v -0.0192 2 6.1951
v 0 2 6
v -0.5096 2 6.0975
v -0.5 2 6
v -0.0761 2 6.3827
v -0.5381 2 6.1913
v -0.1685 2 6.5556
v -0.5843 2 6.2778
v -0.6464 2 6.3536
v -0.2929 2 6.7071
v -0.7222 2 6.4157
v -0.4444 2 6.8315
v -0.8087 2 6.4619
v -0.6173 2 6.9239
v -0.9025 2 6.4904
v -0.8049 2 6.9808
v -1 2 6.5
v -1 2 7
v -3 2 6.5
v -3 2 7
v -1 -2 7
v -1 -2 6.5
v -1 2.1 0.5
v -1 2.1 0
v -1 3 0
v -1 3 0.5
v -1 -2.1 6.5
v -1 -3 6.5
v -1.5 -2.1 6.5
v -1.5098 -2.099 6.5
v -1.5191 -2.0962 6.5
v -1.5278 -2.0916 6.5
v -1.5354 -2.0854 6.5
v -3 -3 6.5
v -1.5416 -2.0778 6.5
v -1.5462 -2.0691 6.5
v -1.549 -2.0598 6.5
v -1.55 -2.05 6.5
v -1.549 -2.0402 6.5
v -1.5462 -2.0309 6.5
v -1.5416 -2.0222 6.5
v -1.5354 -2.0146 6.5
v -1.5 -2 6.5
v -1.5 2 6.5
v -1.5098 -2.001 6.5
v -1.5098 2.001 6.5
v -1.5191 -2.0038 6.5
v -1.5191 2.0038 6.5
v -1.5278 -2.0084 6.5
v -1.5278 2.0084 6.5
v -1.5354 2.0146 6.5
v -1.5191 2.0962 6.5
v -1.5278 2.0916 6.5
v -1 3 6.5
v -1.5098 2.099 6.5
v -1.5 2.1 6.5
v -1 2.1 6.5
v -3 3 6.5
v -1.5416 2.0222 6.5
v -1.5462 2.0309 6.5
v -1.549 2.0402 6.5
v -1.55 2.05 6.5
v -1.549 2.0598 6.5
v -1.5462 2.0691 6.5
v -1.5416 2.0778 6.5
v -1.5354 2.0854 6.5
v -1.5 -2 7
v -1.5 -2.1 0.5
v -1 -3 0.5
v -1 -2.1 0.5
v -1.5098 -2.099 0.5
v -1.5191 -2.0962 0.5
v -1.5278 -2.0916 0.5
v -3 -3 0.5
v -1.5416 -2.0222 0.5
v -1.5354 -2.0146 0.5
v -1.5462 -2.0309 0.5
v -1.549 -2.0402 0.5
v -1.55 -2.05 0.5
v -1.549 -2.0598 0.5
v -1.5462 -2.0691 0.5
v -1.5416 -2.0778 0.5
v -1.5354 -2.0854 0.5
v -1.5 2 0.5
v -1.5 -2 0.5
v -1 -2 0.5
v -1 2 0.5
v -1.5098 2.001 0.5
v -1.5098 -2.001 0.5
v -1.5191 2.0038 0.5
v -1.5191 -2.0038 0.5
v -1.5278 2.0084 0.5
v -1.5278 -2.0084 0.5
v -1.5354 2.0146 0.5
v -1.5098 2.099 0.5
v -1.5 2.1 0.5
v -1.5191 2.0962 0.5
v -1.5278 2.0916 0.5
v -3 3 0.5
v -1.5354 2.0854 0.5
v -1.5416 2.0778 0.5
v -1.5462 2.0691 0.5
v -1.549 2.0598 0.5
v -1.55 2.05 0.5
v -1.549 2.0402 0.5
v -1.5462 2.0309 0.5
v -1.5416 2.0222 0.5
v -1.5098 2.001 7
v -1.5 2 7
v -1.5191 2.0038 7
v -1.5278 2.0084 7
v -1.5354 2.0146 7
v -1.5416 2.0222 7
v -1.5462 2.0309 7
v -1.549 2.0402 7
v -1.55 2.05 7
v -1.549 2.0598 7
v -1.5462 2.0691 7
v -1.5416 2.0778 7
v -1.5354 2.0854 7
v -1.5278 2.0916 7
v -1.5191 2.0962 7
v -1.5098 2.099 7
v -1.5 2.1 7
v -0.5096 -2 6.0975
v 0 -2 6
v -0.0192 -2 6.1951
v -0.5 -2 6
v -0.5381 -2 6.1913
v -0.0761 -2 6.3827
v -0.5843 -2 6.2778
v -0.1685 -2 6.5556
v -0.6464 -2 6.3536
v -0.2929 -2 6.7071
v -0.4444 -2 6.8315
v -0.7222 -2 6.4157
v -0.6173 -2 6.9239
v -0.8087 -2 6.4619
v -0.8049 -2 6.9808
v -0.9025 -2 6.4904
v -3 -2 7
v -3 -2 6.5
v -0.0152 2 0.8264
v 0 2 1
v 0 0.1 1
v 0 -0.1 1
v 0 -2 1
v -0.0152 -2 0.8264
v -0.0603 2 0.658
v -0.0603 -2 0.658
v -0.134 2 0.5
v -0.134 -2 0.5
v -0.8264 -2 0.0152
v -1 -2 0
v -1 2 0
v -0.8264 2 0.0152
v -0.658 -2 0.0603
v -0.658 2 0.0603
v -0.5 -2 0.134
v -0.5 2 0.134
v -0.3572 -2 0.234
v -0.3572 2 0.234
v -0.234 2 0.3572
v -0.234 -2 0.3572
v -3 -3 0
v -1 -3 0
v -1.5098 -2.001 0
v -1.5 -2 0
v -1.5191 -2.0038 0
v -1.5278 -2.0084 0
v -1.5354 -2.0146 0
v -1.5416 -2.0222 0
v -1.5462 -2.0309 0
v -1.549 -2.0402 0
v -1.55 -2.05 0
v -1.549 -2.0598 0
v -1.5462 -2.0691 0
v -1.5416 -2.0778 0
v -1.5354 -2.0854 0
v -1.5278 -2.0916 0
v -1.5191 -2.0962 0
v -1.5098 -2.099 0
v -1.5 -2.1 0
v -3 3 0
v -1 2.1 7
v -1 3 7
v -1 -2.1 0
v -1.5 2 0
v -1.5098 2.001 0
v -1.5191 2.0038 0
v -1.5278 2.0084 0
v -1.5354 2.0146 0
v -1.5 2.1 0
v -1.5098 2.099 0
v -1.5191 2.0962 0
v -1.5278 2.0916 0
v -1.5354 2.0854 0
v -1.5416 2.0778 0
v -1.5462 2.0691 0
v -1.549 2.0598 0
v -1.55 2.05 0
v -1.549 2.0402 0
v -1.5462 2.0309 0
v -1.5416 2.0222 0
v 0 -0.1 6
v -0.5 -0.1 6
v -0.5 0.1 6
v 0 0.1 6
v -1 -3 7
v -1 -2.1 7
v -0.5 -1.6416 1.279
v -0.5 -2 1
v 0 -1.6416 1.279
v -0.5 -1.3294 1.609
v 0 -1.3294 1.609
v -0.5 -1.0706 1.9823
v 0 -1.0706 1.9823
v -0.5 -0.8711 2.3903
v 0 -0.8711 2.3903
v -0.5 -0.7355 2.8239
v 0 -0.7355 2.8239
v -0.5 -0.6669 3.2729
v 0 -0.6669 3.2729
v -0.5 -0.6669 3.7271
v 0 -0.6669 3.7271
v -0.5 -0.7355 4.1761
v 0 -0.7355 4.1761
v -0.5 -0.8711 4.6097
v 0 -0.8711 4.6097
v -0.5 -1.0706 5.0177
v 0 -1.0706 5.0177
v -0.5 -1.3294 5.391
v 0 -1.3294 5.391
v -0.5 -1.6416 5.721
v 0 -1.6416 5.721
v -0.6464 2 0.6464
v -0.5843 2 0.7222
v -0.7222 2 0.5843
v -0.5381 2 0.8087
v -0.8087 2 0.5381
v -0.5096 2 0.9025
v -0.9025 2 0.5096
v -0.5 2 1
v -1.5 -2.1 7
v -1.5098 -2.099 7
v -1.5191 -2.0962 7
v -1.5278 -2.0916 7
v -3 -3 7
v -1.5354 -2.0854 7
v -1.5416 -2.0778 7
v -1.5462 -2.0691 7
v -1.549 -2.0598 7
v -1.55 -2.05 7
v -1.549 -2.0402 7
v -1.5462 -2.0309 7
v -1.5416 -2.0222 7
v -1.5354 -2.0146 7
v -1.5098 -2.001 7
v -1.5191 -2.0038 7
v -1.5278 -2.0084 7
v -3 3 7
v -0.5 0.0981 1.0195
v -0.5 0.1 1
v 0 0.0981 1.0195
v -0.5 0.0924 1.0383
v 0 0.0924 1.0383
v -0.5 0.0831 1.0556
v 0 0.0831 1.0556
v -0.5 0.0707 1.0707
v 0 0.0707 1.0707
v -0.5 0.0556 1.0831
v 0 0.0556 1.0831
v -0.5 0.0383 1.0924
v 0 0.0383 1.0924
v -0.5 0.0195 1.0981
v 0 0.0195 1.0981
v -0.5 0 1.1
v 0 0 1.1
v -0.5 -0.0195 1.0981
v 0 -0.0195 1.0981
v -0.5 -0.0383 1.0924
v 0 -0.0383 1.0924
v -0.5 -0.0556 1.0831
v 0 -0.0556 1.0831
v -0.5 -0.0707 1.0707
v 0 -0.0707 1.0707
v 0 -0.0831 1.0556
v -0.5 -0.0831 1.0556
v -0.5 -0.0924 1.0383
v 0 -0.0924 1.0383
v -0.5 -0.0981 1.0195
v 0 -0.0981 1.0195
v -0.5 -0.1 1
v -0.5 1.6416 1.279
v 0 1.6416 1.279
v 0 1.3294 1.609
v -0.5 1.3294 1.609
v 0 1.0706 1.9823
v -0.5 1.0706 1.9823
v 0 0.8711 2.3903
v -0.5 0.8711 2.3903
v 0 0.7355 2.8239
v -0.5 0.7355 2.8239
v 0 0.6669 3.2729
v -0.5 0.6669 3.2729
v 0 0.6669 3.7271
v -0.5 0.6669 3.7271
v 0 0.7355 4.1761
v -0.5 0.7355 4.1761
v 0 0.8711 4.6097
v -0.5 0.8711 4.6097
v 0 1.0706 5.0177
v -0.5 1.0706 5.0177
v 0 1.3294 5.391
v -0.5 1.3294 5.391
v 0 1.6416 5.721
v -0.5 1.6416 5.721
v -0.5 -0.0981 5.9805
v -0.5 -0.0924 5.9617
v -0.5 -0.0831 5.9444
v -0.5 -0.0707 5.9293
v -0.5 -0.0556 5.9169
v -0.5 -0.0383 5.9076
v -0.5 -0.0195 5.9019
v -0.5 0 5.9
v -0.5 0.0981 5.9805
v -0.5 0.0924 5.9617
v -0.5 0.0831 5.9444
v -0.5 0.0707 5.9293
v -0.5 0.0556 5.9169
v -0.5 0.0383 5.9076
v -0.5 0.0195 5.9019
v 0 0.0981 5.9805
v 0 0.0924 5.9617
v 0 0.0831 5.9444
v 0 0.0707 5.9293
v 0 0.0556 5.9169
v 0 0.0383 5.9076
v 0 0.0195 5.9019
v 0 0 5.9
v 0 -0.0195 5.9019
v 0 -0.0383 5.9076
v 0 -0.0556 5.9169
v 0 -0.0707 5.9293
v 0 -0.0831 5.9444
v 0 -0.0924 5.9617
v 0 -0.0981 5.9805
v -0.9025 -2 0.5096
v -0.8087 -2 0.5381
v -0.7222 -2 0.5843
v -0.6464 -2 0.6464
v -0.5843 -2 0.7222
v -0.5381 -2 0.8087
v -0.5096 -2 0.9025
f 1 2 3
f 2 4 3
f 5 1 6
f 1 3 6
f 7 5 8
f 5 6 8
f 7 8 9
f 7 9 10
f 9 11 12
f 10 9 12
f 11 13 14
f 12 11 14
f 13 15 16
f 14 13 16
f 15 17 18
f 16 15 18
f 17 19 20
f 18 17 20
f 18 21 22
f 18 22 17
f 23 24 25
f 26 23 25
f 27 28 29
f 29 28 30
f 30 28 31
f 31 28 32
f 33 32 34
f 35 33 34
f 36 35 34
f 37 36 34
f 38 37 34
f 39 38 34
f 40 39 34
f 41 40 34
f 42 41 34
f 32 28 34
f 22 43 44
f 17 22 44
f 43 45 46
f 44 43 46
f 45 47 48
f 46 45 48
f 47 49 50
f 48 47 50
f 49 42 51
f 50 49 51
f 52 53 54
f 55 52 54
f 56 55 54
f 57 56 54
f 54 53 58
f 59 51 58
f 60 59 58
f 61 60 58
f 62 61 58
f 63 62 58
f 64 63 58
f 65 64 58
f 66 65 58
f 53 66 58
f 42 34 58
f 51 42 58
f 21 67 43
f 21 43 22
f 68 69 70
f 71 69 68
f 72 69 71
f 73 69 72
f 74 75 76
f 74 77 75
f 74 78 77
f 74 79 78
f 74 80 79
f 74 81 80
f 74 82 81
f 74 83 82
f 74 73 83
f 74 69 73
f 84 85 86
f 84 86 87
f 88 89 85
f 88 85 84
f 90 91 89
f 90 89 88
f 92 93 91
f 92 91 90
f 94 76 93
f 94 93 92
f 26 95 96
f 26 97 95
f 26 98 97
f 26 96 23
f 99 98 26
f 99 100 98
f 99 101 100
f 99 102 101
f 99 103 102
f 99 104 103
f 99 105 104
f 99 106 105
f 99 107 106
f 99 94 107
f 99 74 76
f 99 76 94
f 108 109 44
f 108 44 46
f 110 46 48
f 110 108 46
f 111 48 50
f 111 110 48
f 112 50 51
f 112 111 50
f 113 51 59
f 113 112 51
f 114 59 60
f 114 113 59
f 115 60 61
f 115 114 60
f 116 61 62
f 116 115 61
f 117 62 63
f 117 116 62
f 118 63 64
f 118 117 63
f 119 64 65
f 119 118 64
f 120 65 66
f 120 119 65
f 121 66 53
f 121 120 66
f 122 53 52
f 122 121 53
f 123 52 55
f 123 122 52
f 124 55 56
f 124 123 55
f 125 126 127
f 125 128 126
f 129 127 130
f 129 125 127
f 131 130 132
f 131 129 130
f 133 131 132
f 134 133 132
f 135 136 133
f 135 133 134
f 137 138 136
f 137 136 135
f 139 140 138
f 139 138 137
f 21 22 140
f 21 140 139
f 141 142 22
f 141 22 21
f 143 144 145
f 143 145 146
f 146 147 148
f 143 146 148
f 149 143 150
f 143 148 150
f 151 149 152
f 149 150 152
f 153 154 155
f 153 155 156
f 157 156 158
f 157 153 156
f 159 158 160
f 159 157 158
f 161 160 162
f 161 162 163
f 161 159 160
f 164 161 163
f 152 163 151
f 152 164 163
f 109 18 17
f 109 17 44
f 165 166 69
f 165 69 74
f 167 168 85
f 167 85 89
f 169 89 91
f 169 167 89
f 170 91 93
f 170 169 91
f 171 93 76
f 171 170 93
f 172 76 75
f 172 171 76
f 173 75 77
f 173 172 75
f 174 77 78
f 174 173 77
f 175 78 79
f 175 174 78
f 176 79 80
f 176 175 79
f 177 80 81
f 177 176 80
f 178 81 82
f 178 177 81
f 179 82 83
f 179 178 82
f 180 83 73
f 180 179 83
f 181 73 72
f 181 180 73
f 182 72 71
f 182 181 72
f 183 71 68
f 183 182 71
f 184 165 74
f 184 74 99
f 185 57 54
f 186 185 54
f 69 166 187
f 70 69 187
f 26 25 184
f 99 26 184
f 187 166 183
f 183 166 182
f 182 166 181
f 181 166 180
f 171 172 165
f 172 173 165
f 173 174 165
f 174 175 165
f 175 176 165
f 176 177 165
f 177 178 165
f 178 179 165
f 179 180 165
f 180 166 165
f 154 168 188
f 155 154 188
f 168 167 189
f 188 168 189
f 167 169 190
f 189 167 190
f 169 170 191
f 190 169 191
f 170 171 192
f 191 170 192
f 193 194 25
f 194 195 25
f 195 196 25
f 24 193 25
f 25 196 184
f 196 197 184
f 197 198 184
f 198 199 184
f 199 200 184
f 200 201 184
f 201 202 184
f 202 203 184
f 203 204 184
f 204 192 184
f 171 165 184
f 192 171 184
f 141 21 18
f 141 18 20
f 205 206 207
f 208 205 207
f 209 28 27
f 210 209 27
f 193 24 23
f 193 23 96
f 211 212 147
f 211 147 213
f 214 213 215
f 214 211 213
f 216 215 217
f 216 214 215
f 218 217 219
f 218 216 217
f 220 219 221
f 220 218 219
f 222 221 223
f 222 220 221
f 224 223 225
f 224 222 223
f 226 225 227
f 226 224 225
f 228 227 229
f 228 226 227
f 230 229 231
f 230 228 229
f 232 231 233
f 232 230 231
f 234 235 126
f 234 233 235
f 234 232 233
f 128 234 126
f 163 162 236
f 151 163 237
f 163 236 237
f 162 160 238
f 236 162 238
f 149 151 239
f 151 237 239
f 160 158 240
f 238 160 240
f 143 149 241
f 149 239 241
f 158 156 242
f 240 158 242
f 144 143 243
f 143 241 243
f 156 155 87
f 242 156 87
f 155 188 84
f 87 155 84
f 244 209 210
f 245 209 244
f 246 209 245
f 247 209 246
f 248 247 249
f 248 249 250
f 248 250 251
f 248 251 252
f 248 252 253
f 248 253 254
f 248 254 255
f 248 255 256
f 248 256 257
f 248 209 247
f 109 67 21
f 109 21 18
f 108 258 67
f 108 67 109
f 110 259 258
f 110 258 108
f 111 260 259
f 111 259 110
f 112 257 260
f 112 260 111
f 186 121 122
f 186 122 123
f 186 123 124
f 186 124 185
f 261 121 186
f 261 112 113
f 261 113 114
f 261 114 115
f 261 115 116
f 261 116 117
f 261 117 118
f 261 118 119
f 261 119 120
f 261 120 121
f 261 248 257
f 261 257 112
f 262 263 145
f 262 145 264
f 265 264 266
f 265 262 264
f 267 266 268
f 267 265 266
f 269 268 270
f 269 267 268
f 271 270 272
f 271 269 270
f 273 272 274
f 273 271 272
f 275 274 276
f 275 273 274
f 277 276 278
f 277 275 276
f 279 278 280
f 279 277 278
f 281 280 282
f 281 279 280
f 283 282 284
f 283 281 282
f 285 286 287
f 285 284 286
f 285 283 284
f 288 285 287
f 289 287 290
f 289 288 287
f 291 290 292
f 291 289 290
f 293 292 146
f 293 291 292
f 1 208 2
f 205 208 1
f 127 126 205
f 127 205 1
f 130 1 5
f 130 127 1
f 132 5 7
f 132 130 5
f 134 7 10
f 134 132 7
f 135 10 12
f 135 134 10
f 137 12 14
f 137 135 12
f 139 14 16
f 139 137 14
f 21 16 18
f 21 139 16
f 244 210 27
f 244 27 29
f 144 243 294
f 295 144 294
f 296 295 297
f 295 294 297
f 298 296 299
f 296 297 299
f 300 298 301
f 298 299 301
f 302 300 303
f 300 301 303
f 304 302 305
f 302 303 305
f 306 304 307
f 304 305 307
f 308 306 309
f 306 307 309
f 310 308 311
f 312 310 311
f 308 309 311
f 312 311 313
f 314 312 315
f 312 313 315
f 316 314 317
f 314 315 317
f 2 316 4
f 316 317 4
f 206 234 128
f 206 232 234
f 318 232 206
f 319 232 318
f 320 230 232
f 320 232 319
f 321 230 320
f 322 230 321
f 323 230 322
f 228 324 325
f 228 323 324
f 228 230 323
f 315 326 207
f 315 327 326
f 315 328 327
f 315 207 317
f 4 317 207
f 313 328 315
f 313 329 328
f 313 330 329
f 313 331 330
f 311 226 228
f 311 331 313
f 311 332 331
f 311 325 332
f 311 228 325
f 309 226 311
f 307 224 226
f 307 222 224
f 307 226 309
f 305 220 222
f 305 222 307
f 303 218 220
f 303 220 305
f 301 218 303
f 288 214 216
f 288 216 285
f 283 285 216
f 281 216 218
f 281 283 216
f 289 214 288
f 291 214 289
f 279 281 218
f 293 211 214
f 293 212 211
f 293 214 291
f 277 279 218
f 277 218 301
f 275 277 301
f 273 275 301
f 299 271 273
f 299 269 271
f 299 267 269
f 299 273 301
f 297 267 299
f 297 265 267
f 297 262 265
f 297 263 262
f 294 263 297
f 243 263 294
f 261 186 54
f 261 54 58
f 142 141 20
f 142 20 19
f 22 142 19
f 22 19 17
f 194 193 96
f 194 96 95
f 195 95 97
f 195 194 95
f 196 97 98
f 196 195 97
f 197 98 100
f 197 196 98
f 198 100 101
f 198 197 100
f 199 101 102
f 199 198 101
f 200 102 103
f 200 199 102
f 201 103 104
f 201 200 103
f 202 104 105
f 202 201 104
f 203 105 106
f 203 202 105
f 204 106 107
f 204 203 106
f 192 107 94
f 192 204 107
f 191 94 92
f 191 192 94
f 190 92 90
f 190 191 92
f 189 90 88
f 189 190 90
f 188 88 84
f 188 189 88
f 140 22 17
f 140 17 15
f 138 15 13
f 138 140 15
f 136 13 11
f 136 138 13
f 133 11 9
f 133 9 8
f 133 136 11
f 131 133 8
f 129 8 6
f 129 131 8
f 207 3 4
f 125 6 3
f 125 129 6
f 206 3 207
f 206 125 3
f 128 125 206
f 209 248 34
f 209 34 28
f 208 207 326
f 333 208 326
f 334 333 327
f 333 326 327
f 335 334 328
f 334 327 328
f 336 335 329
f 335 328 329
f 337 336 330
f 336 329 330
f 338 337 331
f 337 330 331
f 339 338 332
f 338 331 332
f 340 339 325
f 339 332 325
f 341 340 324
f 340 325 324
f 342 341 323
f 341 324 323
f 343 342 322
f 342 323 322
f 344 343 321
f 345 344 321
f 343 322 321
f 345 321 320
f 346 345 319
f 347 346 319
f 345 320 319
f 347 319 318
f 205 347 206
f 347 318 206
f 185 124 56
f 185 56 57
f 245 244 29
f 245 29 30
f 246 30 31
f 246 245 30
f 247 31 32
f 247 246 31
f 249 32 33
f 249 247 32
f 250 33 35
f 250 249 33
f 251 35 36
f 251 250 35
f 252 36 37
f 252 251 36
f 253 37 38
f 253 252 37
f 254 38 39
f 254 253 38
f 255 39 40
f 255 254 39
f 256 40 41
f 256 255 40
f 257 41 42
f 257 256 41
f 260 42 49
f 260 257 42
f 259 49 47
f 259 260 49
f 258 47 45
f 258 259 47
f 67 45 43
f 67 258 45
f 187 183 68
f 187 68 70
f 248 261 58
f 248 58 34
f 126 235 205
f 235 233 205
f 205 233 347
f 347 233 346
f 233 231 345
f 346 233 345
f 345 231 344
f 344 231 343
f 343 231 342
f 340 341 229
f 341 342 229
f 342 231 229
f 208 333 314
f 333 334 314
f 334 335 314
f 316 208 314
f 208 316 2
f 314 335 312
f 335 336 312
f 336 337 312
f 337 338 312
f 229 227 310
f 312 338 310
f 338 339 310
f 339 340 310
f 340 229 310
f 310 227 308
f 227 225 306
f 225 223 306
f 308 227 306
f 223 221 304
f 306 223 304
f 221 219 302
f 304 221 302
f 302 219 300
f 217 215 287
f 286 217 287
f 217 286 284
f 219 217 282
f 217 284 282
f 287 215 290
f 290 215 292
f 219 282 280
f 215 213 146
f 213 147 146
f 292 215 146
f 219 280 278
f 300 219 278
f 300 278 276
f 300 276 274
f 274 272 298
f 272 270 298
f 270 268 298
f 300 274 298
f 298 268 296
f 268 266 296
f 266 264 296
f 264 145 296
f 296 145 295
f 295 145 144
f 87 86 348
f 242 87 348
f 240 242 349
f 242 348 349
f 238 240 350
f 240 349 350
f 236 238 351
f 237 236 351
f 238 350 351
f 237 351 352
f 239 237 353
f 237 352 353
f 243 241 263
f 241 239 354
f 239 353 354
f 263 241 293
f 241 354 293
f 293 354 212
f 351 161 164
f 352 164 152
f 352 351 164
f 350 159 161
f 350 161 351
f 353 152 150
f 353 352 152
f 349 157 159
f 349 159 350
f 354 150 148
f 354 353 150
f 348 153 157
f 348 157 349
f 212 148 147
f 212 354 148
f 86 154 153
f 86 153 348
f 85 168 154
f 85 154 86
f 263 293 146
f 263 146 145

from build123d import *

# Parameters (mm, degrees)
SKETCH1_W                    = 6
SKETCH1_H                    = 3
BASE_FLANGE1_DEPTH           = 0.5
EDGE_FLANGE1_DEPTH           = 0.5
EDGE_FLANGE1_2_OUTLINE_W     = 0.5
EDGE_FLANGE1_2_OUTLINE_H     = 4
EDGE_FLANGE1_2_DEPTH         = 0.04719
EDGE_FLANGE1_START           = 1
EDGE_FLANGE1_3_OUTLINE_W     = 0.5
EDGE_FLANGE1_3_OUTLINE_H     = 4
EDGE_FLANGE1_3_DEPTH         = 6
EDGE_FLANGE1_START_2         = -2
EDGE_FLANGE1_4_DEPTH         = 4
EDGE_FLANGE1_5_DEPTH         = 4
BOSS_EXTRUDE2_DEPTH          = 0.5
EDGE_FLANGE2_STRIP_W         = 3
EDGE_FLANGE2_STRIP_H         = 0.5
EDGE_FLANGE2_STRIP_CUT_DEPTH = 4
EDGE_FLANGE2_DEPTH           = 4
CUT_EXTRUDE1_DEPTH           = 8.762087348
CUT_EXTRUDE1_DEPTH_BACK      = 8.762087348
SKETCH14_W                   = 1
SKETCH14_H                   = 0.9
CUT_EXTRUDE2_DEPTH           = 9.185352772
CUT_EXTRUDE2_DEPTH_BACK      = 9.185352772


with BuildPart() as part:
    # Base-Flange1: sheet metal written as solids
    # Sketch1 → Base-Flange1 (new body)
    with BuildSketch(Plane(origin=(0, 0, 0), x_dir=(0, 1, 0), z_dir=(0, 0, 1))):
        with Locations((0, 1.5)):
            Rectangle(SKETCH1_W, SKETCH1_H)
    extrude(amount=BASE_FLANGE1_DEPTH)

    # Edge-Flange1: read off the stored shape, not the designer's step
    # Edge-Flange1 outline → Edge-Flange1 (cut)
    with BuildSketch(Plane.XY):
        with BuildLine():
            Line((-1.5, 2), (0, 2))
            Line((0, 2), (0, 2.1))
            Line((0, 2.1), (-1.5, 2.1))
            ThreePointArc((-1.5, 2.1), (-1.55, 2.05), (-1.5, 2))
        make_face()
        with BuildLine():
            Line((0, -2.1), (0, -2))
            Line((0, -2), (-1.5, -2))
            ThreePointArc((-1.5, -2), (-1.55, -2.05), (-1.5, -2.1))
            Line((-1.5, -2.1), (0, -2.1))
        make_face()
    extrude(amount=EDGE_FLANGE1_DEPTH, mode=Mode.SUBTRACT)

    # Edge-Flange1 2 outline → Edge-Flange1 2 (cut)
    with BuildSketch(Plane.XY):
        with Locations((-0.25, 0)):
            Rectangle(EDGE_FLANGE1_2_OUTLINE_W, EDGE_FLANGE1_2_OUTLINE_H)
    extrude(amount=EDGE_FLANGE1_2_DEPTH, mode=Mode.SUBTRACT)

    # Edge-Flange1 4 outline → Edge-Flange1 4 (cut)
    with BuildSketch(Plane(origin=(0, 0, 0), x_dir=(1, 0, 0), z_dir=(0, 1, 0)).offset(EDGE_FLANGE1_START_2)):
        with BuildLine():
            ThreePointArc((-1, 0), (-0.5, -0.133974596), (-0.133974596, -0.5))
            Line((-0.133974596, -0.5), (0, -0.5))
            Line((0, -0.5), (0, -0.04719))
            Line((0, -0.04719), (-0.5, -0.04719))
            Line((-0.5, -0.04719), (-0.5, 0))
            Line((-0.5, 0), (-1, 0))
        make_face()
    extrude(amount=EDGE_FLANGE1_4_DEPTH, mode=Mode.SUBTRACT)



with BuildPart() as body_2:
    # Edge-Flange1 3 outline → Edge-Flange1 3 (new body)
    with BuildSketch(Plane.XY.offset(EDGE_FLANGE1_START)):
        with Locations((-0.25, 0)):
            Rectangle(EDGE_FLANGE1_3_OUTLINE_W, EDGE_FLANGE1_3_OUTLINE_H)
    extrude(amount=EDGE_FLANGE1_3_DEPTH)


with BuildPart() as part_1:
    add(part.part)

    add(body_2.part)  # Edge-Flange1 5 merges body 2
    # Edge-Flange1 5 outline → Edge-Flange1 5 (add)
    with BuildSketch(Plane(origin=(0, 0, 0), x_dir=(1, 0, 0), z_dir=(0, 1, 0)).offset(EDGE_FLANGE1_START_2)):
        with BuildLine():
            Line((-0.5, -1), (0, -1))
            ThreePointArc((0, -1), (-0.034074174, -0.741180955), (-0.133974596, -0.5))
            Line((-0.133974596, -0.5), (-1, -0.5))
            ThreePointArc((-1, -0.5), (-0.646446609, -0.646446609), (-0.5, -1))
        make_face()
    extrude(amount=EDGE_FLANGE1_5_DEPTH)

    # Edge-Flange2: sheet metal written as solids
    # Edge-Flange2 strip (on a plane across the edge) → Edge-Flange2 strip cut (cut)
    with BuildSketch(Plane(origin=(-0.5, -2, 7), x_dir=(0, 0, -1), z_dir=(0, 1, 0))):
        with Locations((-0.5, -0.25)):
            Rectangle(EDGE_FLANGE2_STRIP_W, EDGE_FLANGE2_STRIP_H)
    extrude(amount=EDGE_FLANGE2_STRIP_CUT_DEPTH, mode=Mode.SUBTRACT)

    # Edge-Flange2 section (on a plane across the edge) → Edge-Flange2 (add)
    with BuildSketch(Plane(origin=(-0.5, -2, 7), x_dir=(0, 0, -1), z_dir=(0, 1, 0))):
        with BuildLine():
            Line((0, 0.5), (0, 2.5))
            Line((0, 2.5), (0.5, 2.5))
            Line((0.5, 2.5), (0.5, 0.5))
            ThreePointArc((0.5, 0.5), (0.646446609, 0.146446609), (1, 0))
            Line((1, 0), (1, -0.5))
            ThreePointArc((1, -0.5), (0.292893219, -0.207106781), (0, 0.5))
        make_face()
    extrude(amount=EDGE_FLANGE2_DEPTH)


with BuildPart() as body_2_2:
    # Sketch10 → Boss-Extrude2 (new body)
    with BuildSketch(Plane(origin=(0, 0, 7), x_dir=(0, 1, 0), z_dir=(0, 0, 1))):
        with BuildLine():
            Line((3, 3), (-3, 3))
            Line((-3, 3), (-3, 0))
            Line((-3, 0), (-2.1, 0))
            Line((-2.1, 0), (-2.1, 1.5))
            ThreePointArc((-2.1, 1.5), (-2.05, 1.55), (-2, 1.5))
            Line((-2, 1.5), (-2, 1))
            Line((-2, 1), (2, 1))
            Line((2, 1), (2, 1.5))
            ThreePointArc((2, 1.5), (2.05, 1.55), (2.1, 1.5))
            Line((2.1, 1.5), (2.1, 0))
            Line((2.1, 0), (3, 0))
            Line((3, 0), (3, 3))
        make_face()
    extrude(amount=-BOSS_EXTRUDE2_DEPTH)


with BuildPart() as cut_extrude1_tool:
    # Sketch14 → Cut-Extrude1 (new, two sides: drawn at the far end of the back side and taken through both)
    with BuildSketch(Plane.XY.offset(0.5).offset(-CUT_EXTRUDE1_DEPTH_BACK)):
        with Locations((-0.5, 2.55)):
            Rectangle(SKETCH14_W, SKETCH14_H)
        with Locations((-0.5, -2.55)):
            Rectangle(SKETCH14_W, SKETCH14_H)
    extrude(amount=CUT_EXTRUDE1_DEPTH + CUT_EXTRUDE1_DEPTH_BACK)


with BuildPart() as part_2:
    add(part_1.part)

    # Cut-Extrude1: cut by cut_extrude1_tool
    add(cut_extrude1_tool.part, mode=Mode.SUBTRACT)

    # Sketch15 → Cut-Extrude2 (cut, two sides: drawn at the far end of the back side and taken through both)
    with BuildSketch(Plane.YZ.offset(-CUT_EXTRUDE2_DEPTH_BACK)):
        with BuildLine():
            Line((-2, 6), (-2, 1))
            ThreePointArc((-2, 1), (-0.658312395, 3.5), (-2, 6))
        make_face()
        with BuildLine():
            Line((2, 6), (2, 1))
            ThreePointArc((2, 1), (0.658312395, 3.5), (2, 6))
        make_face()
        with BuildLine():
            Line((-0.1, 6), (0.1, 6))
            ThreePointArc((0.1, 6), (0, 5.9), (-0.1, 6))
        make_face()
        with BuildLine():
            Line((-0.1, 1), (0.1, 1))
            ThreePointArc((0.1, 1), (0, 1.1), (-0.1, 1))
        make_face()
    extrude(amount=CUT_EXTRUDE2_DEPTH + CUT_EXTRUDE2_DEPTH_BACK, mode=Mode.SUBTRACT)


with BuildPart() as body_2_2_1:
    add(body_2_2.part)

    # Cut-Extrude1: cut by cut_extrude1_tool
    add(cut_extrude1_tool.part, mode=Mode.SUBTRACT)


solid = Compound([part_2.part, body_2_2_1.part])
